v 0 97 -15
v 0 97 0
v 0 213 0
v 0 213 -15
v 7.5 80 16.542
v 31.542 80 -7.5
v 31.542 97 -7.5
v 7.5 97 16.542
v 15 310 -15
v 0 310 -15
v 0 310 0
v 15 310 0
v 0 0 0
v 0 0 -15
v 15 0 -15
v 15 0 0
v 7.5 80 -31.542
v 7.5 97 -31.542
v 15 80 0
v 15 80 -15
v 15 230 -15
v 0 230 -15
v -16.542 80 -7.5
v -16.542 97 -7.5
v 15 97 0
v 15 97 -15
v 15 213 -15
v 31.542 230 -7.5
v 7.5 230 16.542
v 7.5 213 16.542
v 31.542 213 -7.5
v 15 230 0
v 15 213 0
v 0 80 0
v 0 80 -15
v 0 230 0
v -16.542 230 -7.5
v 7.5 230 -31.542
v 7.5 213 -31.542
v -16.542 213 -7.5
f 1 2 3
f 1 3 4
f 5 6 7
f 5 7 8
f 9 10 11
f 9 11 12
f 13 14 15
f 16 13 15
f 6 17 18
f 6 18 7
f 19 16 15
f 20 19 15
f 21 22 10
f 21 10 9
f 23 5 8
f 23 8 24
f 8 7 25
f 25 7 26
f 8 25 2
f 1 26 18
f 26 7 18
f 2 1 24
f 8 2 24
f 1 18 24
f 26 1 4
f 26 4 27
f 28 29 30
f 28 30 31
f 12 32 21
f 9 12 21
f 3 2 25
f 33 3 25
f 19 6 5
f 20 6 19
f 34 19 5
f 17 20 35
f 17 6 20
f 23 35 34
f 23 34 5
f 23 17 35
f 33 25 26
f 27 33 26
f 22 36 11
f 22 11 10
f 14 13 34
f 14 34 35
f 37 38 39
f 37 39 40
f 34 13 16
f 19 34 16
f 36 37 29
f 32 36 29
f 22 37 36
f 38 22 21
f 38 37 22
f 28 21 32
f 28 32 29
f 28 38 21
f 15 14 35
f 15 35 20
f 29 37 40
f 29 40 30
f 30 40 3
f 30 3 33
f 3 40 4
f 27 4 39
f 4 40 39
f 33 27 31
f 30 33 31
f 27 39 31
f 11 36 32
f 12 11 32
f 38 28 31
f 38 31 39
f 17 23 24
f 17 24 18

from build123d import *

# Parameters (mm, degrees)
SKETCH_1_W      = 15
SKETCH_1_H      = 15
EXTRUDE_1_DEPTH = 310
EXTRUDE_3_DEPTH = 17
EXTRUDE_4_DEPTH = 17


with BuildPart() as part:
    # 草图1 → 凸台-拉伸1 (new body)
    with BuildSketch(Plane(origin=(0, 0, 0), x_dir=(1, 0, 0), z_dir=(0, 1, 0))):
        with Locations((7.5, 7.5)):
            Rectangle(SKETCH_1_W, SKETCH_1_H)
    extrude(amount=EXTRUDE_1_DEPTH)

    # 草图3 → 凸台-拉伸3 (add)
    with BuildSketch(Plane(origin=(0, 80, 0), x_dir=(-1, 0, 0), z_dir=(0, -1, 0))):
        Polygon((-7.5, 31.54163056), (-31.54163056, 7.5), (-7.5, -16.54163056), (16.54163056, 7.5), align=None)
    extrude(amount=-EXTRUDE_3_DEPTH)

    # 草图4 → 凸台-拉伸4 (add)
    with BuildSketch(Plane(origin=(0, 230, 0), x_dir=(1, 0, 0), z_dir=(0, 1, 0))):
        Polygon((7.5, 31.54163056), (-16.54163056, 7.5), (7.5, -16.54163056), (31.54163056, 7.5), align=None)
    extrude(amount=-EXTRUDE_4_DEPTH)


solid = part.part
